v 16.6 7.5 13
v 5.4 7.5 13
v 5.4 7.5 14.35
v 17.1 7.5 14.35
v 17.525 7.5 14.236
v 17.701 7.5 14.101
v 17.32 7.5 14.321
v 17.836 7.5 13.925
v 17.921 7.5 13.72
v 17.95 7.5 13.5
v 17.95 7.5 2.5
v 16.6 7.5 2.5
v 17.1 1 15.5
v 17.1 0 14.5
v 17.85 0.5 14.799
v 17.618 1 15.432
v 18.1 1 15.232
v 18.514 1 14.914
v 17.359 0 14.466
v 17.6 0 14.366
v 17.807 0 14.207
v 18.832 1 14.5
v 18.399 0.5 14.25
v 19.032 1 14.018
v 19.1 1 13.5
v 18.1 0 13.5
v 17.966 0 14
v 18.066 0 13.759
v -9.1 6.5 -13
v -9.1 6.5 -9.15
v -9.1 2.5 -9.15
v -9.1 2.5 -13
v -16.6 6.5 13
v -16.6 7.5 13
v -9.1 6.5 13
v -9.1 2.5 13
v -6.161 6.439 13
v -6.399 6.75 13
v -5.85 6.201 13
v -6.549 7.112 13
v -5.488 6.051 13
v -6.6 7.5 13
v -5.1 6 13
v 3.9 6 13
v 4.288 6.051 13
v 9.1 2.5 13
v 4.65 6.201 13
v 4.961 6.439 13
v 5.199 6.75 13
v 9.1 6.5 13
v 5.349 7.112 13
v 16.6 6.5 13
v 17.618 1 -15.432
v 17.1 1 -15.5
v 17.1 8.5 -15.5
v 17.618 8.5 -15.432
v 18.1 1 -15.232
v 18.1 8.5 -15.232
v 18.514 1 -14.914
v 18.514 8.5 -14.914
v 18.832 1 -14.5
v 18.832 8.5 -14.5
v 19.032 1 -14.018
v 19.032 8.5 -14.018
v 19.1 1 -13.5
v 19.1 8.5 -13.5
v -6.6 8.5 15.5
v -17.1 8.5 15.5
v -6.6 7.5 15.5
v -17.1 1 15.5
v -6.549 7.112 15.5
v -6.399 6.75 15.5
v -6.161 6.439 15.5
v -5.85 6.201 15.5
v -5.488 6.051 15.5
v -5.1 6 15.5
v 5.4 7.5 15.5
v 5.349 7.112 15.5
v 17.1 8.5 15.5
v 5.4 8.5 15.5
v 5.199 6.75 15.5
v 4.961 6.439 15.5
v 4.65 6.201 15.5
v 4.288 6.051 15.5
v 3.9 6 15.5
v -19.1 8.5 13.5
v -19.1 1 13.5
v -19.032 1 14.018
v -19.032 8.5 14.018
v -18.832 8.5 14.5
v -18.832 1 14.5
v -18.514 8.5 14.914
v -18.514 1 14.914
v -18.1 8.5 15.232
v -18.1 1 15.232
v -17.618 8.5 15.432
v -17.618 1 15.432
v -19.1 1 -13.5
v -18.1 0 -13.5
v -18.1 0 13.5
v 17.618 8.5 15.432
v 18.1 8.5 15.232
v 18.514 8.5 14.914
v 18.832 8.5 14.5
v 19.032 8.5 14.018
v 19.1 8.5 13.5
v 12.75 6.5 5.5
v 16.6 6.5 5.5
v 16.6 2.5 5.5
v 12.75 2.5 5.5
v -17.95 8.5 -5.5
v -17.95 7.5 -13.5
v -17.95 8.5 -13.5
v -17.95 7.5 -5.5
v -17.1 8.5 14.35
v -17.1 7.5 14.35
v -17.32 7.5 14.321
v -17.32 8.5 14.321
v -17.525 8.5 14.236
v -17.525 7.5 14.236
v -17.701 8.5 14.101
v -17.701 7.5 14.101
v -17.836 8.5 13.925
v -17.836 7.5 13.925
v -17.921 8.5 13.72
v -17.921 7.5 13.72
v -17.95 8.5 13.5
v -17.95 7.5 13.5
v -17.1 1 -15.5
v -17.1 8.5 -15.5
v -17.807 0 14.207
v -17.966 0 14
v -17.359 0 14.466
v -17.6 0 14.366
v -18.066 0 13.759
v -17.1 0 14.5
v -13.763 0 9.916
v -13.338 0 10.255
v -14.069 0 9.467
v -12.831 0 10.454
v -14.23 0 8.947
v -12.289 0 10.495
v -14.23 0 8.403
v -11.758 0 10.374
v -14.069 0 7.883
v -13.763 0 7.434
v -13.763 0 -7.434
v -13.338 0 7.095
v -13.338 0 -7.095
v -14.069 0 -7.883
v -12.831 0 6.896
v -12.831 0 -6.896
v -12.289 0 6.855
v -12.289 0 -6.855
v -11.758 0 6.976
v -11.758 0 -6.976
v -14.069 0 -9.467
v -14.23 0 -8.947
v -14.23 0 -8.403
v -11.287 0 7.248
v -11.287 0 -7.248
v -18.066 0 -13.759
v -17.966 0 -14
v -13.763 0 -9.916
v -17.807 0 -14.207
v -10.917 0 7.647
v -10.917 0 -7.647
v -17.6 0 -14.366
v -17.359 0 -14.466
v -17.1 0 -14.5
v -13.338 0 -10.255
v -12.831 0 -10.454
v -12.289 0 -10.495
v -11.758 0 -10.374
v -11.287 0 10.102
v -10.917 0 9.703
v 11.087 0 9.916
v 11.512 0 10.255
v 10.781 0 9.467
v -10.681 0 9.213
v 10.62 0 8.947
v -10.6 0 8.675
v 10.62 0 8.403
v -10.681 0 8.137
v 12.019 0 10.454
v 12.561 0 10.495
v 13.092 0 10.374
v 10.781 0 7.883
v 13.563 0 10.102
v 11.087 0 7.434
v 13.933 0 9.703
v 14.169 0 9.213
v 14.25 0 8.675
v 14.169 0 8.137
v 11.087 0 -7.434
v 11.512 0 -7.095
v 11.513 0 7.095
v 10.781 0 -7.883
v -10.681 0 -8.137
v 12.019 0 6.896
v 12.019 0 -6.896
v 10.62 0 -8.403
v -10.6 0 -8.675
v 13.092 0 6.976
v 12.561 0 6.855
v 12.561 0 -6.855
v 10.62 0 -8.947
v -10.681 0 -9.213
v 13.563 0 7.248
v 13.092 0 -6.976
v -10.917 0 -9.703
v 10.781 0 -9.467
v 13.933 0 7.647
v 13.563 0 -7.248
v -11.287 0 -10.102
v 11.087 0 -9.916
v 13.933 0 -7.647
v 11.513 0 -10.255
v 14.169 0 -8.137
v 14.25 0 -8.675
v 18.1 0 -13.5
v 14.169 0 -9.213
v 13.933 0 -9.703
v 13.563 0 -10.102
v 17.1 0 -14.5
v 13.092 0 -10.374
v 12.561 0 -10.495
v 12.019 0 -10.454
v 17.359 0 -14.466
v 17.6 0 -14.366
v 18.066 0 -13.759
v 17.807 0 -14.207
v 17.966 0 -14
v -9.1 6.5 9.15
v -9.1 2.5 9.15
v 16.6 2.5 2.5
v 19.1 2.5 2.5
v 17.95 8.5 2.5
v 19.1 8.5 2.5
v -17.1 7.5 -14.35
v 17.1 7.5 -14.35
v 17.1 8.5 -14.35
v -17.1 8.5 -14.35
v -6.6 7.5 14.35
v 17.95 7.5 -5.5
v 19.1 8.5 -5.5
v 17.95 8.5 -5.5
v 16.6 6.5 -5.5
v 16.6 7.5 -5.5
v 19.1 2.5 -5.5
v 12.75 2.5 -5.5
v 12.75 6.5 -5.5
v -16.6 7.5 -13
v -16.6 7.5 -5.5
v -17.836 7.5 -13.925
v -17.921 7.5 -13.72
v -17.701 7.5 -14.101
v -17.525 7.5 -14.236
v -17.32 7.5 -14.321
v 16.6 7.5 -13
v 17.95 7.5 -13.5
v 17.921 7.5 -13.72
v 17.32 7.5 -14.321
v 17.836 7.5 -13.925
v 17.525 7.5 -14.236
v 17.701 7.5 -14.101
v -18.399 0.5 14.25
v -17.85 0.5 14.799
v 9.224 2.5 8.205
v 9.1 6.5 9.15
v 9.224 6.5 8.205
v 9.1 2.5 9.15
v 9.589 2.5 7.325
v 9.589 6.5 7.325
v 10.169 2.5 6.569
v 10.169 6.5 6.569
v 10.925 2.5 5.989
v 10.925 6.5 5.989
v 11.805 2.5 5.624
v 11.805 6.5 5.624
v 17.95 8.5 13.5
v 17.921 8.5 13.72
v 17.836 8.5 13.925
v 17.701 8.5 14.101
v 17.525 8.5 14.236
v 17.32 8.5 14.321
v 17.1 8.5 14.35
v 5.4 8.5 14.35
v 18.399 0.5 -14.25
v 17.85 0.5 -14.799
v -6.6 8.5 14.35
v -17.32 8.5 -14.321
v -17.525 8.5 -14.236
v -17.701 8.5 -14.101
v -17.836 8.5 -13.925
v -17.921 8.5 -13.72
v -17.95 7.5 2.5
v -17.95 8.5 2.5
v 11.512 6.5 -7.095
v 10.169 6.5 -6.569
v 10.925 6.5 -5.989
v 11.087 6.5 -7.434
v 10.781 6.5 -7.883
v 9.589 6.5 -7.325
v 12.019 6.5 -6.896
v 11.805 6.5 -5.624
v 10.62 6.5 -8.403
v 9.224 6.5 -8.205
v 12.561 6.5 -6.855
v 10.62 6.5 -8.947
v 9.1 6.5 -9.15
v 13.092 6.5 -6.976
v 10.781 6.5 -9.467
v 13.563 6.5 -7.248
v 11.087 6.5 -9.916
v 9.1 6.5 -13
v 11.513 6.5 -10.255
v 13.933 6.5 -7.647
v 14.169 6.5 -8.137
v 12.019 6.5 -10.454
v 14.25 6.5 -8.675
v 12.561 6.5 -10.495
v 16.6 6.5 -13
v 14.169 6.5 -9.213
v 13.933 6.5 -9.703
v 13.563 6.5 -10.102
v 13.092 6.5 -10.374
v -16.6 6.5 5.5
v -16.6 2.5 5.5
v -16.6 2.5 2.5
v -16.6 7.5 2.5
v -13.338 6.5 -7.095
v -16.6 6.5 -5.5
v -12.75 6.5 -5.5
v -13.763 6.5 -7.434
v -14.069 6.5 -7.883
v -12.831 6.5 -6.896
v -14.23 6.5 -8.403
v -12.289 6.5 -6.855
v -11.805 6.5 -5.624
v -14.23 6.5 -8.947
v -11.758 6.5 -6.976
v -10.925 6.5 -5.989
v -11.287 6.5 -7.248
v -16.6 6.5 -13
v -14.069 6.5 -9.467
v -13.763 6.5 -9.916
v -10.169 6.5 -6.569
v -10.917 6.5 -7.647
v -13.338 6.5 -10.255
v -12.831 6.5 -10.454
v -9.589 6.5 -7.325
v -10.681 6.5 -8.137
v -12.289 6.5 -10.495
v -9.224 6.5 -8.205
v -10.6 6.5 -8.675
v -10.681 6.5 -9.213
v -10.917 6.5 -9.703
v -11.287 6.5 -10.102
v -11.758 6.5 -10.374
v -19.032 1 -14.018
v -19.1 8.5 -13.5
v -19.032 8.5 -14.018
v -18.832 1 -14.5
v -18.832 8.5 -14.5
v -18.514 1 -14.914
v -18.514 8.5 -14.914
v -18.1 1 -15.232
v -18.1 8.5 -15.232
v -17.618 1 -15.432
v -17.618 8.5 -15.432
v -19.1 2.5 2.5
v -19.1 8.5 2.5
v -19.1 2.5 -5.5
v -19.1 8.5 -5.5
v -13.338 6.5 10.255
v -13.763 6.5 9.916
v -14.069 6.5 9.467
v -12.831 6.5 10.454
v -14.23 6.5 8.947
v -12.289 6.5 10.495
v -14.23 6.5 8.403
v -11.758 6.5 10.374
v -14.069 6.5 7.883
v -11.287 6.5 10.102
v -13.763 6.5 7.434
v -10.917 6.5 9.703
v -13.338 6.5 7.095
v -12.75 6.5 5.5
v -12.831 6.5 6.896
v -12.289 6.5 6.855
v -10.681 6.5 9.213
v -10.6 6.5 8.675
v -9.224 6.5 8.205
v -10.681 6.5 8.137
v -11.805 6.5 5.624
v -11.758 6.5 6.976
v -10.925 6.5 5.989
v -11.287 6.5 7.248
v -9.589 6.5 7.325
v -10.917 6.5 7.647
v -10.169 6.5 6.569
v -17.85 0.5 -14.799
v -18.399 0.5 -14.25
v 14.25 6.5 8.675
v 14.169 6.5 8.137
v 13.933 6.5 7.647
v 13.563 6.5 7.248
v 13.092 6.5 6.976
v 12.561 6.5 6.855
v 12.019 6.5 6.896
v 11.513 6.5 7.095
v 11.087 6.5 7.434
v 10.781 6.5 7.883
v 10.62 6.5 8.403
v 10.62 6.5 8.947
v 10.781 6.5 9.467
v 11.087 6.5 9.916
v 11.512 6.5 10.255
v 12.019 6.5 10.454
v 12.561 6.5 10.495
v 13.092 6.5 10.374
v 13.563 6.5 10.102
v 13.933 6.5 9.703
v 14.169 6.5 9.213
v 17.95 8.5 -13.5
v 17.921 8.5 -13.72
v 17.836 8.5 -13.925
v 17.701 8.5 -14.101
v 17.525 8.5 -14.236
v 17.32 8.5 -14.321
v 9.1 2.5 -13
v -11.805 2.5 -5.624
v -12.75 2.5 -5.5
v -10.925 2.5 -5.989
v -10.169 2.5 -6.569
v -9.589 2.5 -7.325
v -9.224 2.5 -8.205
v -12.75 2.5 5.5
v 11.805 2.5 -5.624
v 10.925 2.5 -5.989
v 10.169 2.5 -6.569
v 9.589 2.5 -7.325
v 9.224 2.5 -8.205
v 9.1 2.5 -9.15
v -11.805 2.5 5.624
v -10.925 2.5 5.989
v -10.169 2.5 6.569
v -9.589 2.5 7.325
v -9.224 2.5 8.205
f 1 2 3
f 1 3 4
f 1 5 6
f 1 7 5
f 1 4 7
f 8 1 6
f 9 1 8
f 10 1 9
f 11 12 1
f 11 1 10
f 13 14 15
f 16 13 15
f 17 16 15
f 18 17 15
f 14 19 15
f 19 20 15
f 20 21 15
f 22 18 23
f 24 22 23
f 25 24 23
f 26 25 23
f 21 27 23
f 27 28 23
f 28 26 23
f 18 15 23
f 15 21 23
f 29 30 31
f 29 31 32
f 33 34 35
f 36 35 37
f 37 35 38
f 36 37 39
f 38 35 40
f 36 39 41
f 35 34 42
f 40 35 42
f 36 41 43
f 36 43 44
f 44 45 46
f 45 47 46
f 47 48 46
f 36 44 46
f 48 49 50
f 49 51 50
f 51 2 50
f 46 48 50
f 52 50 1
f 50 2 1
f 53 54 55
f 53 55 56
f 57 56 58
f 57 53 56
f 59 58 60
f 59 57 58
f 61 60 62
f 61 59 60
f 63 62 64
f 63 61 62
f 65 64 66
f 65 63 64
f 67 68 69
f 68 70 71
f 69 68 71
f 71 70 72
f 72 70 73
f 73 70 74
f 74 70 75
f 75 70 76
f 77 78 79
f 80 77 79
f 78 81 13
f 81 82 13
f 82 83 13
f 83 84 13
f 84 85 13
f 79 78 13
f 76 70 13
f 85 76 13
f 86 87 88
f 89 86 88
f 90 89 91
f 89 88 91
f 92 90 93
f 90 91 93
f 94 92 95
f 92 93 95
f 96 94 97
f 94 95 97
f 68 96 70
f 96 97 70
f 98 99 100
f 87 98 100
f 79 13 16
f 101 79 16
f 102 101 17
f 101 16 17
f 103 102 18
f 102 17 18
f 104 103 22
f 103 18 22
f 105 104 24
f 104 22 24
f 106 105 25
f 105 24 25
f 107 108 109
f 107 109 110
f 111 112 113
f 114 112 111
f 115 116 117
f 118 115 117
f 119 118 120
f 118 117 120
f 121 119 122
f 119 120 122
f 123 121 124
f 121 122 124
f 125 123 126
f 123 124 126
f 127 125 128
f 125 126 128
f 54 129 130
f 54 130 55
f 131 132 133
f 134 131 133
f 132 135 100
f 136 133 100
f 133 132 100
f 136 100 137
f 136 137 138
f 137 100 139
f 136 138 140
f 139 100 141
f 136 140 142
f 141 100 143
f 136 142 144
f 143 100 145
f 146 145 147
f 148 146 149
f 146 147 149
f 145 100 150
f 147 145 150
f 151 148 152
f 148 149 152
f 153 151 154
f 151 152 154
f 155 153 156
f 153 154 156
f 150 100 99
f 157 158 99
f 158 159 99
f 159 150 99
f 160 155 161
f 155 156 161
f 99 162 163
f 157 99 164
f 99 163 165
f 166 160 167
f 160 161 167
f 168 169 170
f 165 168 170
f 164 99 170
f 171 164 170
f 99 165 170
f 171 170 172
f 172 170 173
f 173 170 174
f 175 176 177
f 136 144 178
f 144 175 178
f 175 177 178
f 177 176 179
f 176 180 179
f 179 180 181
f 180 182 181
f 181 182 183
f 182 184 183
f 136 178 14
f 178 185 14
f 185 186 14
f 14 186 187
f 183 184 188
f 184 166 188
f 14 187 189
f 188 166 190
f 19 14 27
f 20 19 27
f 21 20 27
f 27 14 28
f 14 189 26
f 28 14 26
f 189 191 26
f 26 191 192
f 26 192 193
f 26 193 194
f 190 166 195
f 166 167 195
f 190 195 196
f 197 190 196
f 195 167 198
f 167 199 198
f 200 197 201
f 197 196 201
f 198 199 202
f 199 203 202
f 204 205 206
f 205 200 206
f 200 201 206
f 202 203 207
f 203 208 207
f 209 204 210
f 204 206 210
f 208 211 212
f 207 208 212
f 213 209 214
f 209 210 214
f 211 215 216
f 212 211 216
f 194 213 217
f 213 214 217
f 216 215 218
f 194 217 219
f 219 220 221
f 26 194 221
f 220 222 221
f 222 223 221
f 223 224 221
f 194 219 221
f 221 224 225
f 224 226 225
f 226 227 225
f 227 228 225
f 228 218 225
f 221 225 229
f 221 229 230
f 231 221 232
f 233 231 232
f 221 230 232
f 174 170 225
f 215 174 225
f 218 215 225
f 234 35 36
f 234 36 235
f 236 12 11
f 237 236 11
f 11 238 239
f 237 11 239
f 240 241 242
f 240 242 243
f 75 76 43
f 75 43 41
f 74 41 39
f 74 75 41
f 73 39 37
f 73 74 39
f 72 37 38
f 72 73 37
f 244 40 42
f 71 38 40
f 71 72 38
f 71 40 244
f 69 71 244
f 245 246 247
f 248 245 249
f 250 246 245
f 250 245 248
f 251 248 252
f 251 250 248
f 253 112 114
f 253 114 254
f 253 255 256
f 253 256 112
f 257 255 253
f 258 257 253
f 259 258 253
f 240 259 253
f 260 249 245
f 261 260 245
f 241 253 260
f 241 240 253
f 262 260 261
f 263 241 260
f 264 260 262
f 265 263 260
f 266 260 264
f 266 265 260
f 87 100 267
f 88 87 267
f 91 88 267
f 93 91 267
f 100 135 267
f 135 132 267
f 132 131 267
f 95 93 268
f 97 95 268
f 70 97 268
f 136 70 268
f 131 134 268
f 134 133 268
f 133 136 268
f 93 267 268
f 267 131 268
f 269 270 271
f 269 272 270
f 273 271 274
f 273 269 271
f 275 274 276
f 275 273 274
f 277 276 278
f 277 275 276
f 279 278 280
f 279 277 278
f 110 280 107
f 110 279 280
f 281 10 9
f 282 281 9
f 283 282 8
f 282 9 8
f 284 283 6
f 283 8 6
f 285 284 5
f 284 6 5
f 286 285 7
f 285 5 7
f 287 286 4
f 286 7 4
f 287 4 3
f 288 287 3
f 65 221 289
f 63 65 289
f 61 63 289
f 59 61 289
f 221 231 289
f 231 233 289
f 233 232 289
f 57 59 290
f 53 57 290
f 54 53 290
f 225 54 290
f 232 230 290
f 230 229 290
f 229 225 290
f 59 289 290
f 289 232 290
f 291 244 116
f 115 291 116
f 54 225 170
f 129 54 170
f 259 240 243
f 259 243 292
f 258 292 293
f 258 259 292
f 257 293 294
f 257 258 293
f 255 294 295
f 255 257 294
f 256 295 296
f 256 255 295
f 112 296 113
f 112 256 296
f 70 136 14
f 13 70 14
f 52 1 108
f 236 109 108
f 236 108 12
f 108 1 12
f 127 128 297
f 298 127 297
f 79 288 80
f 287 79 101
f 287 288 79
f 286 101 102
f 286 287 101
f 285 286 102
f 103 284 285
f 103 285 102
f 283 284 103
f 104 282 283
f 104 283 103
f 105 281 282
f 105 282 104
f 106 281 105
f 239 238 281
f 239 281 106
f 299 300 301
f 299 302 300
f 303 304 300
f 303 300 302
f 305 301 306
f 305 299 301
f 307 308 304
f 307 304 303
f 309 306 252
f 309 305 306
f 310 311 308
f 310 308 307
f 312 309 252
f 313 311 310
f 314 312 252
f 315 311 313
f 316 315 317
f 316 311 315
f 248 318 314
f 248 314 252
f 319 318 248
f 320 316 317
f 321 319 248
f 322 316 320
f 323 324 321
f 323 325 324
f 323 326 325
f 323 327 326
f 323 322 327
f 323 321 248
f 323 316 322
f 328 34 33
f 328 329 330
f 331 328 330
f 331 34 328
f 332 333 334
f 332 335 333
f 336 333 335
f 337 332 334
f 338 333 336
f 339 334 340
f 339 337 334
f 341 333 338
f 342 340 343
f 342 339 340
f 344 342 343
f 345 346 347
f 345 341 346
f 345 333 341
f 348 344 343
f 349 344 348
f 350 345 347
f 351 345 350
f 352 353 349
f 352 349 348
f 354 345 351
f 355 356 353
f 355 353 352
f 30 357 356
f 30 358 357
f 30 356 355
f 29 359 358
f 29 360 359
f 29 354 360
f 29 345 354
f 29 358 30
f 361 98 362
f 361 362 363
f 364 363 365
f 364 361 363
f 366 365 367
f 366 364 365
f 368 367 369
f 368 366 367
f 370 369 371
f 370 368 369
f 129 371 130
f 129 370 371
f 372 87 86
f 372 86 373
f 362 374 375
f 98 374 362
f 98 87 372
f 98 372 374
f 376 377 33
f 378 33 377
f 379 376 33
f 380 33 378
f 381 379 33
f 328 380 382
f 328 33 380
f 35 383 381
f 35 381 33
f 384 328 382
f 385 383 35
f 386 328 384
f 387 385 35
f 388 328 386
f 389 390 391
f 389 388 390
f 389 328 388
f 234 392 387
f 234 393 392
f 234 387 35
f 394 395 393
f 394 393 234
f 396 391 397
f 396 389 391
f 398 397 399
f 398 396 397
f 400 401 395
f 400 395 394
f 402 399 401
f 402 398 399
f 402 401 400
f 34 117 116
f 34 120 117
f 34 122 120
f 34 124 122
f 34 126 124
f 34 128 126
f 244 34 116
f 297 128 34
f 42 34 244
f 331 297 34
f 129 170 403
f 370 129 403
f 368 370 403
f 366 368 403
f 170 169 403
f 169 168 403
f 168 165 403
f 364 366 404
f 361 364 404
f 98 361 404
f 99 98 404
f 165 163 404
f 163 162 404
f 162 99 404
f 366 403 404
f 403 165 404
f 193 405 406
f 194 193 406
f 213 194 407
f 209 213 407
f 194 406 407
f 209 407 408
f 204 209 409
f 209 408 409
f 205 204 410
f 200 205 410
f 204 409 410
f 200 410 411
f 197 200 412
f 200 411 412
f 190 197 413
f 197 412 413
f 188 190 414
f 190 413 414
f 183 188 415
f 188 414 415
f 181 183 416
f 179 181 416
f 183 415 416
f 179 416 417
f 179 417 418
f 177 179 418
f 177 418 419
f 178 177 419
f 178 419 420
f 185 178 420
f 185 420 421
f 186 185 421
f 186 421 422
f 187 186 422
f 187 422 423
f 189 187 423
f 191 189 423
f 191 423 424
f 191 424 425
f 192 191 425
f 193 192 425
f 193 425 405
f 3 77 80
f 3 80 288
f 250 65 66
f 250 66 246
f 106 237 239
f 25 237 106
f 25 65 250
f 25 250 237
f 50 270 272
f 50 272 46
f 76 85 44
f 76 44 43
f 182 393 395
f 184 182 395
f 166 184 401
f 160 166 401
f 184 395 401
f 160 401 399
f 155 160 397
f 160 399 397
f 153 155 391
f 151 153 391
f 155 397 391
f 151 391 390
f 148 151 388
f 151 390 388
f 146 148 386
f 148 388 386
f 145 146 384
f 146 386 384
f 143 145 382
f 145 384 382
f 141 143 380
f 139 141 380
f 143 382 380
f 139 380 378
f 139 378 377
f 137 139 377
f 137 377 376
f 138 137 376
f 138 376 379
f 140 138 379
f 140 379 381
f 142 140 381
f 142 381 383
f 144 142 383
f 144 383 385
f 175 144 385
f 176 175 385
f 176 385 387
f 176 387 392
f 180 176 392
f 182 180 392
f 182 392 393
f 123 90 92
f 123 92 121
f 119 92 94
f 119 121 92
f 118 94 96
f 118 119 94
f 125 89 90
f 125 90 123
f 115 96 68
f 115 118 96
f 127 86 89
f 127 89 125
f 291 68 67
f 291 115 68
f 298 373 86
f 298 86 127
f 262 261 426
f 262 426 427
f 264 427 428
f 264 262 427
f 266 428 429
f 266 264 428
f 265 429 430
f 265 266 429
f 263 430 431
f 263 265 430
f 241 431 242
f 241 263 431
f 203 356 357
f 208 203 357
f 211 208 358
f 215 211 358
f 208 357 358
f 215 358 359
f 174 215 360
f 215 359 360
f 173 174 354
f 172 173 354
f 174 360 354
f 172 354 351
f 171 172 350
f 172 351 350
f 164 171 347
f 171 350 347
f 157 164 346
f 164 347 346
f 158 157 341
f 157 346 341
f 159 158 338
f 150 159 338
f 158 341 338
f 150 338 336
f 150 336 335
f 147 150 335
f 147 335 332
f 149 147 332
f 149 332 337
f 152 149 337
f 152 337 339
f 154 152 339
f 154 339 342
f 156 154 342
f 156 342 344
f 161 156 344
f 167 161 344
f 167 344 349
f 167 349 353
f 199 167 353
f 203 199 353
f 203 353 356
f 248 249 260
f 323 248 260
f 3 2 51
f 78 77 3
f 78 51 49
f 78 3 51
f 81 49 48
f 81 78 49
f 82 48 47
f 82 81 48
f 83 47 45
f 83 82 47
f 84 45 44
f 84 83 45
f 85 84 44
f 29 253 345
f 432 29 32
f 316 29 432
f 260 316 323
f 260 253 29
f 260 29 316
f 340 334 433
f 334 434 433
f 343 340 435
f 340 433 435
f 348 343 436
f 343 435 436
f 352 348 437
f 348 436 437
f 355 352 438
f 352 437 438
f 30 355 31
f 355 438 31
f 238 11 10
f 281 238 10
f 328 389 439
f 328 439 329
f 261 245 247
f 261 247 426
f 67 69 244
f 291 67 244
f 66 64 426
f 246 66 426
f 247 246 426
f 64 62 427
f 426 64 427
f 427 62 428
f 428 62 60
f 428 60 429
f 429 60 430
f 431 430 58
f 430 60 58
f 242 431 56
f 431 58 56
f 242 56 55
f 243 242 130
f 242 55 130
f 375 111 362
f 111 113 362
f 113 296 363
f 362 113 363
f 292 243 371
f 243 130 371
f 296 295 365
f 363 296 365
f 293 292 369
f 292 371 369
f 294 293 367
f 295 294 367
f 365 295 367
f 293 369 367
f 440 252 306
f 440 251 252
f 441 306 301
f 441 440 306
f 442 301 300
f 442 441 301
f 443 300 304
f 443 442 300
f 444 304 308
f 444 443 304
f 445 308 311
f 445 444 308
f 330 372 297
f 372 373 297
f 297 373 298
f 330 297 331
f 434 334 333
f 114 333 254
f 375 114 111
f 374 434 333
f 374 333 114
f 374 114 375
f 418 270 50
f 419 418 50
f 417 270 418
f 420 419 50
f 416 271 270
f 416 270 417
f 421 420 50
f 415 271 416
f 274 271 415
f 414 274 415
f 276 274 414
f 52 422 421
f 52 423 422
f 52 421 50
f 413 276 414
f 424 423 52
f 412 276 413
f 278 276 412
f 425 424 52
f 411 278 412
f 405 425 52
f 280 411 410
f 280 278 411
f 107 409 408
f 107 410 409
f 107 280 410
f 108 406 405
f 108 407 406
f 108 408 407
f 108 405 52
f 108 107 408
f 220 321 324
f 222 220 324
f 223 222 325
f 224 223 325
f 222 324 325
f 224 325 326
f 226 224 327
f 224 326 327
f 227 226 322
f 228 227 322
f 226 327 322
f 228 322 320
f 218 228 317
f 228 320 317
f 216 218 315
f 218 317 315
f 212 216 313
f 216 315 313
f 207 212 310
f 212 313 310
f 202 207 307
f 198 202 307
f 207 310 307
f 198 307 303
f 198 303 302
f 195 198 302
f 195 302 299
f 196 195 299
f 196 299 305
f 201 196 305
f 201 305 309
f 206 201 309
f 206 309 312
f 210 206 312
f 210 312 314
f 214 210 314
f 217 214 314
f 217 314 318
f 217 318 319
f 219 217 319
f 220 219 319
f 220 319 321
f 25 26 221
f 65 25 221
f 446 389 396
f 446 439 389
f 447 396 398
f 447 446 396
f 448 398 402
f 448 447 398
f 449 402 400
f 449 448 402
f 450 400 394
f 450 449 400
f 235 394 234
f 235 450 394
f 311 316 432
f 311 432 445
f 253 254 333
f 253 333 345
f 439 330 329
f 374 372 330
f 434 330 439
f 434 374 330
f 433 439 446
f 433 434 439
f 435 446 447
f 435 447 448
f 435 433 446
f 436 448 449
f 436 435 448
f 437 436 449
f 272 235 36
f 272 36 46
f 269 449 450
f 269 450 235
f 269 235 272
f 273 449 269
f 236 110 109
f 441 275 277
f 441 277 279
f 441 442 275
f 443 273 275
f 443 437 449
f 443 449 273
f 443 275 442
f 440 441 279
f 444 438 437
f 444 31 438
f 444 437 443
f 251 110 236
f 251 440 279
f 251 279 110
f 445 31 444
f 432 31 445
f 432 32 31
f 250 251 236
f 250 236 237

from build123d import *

# Parameters (mm, degrees)
BOSS_EXTRUDE1_DEPTH = 7.5
CUT_EXTRUDE3_DEPTH  = 5
SKETCH3_R           = 1.825
CUT_EXTRUDE4_DEPTH  = 13.5
SKETCH4_W           = 33.2
SKETCH4_H           = 26
CUT_EXTRUDE5_DEPTH  = 1
SKETCH5_W           = 2.5
SKETCH5_H           = 8
CUT_EXTRUDE6_DEPTH  = 5
BOSS_EXTRUDE2_DEPTH = 1
CUT_EXTRUDE8_DEPTH  = 10
SKETCH9_W           = 0.917517868
SKETCH9_H           = 1.289779541
SKETCH9_W_2         = 0.704402717
CUT_EXTRUDE9_DEPTH  = 1
CHAMFER1_SIZE       = 1
FILLET1_R           = 3.65


with BuildPart() as part:
    # Sketch1 → Boss-Extrude1 (new body)
    with BuildSketch(Plane(origin=(0, 0, 0), x_dir=(1, 0, 0), z_dir=(0, 1, 0))):
        with BuildLine():
            Line((-17.1, -15.5), (17.1, -15.5))
            ThreePointArc((17.1, -15.5), (18.514213562, -14.914213562), (19.1, -13.5))
            Line((19.1, -13.5), (19.1, 13.5))
            ThreePointArc((19.1, 13.5), (18.514213562, 14.914213562), (17.1, 15.5))
            Line((17.1, 15.5), (-17.1, 15.5))
            ThreePointArc((-17.1, 15.5), (-18.514213562, 14.914213562), (-19.1, 13.5))
            Line((-19.1, 13.5), (-19.1, -13.5))
            ThreePointArc((-19.1, -13.5), (-18.514213562, -14.914213562), (-17.1, -15.5))
        make_face()
    extrude(amount=BOSS_EXTRUDE1_DEPTH)

    # Sketch2 → Cut-Extrude3 (cut)
    with BuildSketch(Plane(origin=(0, 7.5, 0), x_dir=(1, 0, 0), z_dir=(0, 1, 0))):
        Polygon((-16.6, 5.5), (-9.1, 5.5), (-9.1, 13), (9.1, 13), (9.1, 5.5), (16.6, 5.5), (16.6, -5.5), (9.1, -5.5), (9.1, -13), (-9.1, -13), (-9.1, -5.5), (-16.6, -5.5), align=None)
    extrude(amount=-CUT_EXTRUDE3_DEPTH, mode=Mode.SUBTRACT)

    # Sketch3 → Cut-Extrude4 (cut)
    with BuildSketch(Plane(origin=(0, 7.5, 0), x_dir=(1, 0, 0), z_dir=(0, 1, 0))):
        with Locations((-12.425, 8.675)):
            Circle(SKETCH3_R)
        with Locations((12.425, 8.675)):
            Circle(SKETCH3_R)
        with Locations((12.425, -8.675)):
            Circle(SKETCH3_R)
        with Locations((-12.425, -8.675)):
            Circle(SKETCH3_R)
    extrude(amount=-CUT_EXTRUDE4_DEPTH, mode=Mode.SUBTRACT)

    # Sketch4 → Cut-Extrude5 (cut)
    with BuildSketch(Plane(origin=(0, 7.5, 0), x_dir=(1, 0, 0), z_dir=(0, 1, 0))):
        Rectangle(SKETCH4_W, SKETCH4_H)
    extrude(amount=-CUT_EXTRUDE5_DEPTH, mode=Mode.SUBTRACT)

    # Sketch5 → Cut-Extrude6 (cut)
    with BuildSketch(Plane(origin=(0, 7.5, 0), x_dir=(1, 0, 0), z_dir=(0, 1, 0))):
        with Locations((-17.85, 1.5)):
            Rectangle(SKETCH5_W, SKETCH5_H)
        with Locations((17.85, 1.5)):
            Rectangle(SKETCH5_W, SKETCH5_H)
    extrude(amount=-CUT_EXTRUDE6_DEPTH, mode=Mode.SUBTRACT)

    # Sketch6 → Boss-Extrude2 (add)
    with BuildSketch(Plane(origin=(0, 7.5, 0), x_dir=(1, 0, 0), z_dir=(0, 1, 0))):
        with BuildLine():
            Line((-17.95, 5.5), (-19.1, 5.5))
            Line((-19.1, 5.5), (-19.1, 13.5))
            ThreePointArc((-19.1, 13.5), (-18.514213562, 14.914213562), (-17.1, 15.5))
            Line((-17.1, 15.5), (17.1, 15.5))
            ThreePointArc((17.1, 15.5), (18.514213562, 14.914213562), (19.1, 13.5))
            Line((19.1, 13.5), (19.1, 5.5))
            Line((19.1, 5.5), (17.95, 5.5))
            Line((17.95, 5.5), (17.95, 13.5))
            ThreePointArc((17.95, 13.5), (17.701040764, 14.101040764), (17.1, 14.35))
            Line((17.1, 14.35), (-17.1, 14.35))
            ThreePointArc((-17.1, 14.35), (-17.701040764, 14.101040764), (-17.95, 13.5))
            Line((-17.95, 13.5), (-17.95, 5.5))
        make_face()
        with BuildLine():
            Line((-17.95, -2.5), (-19.1, -2.5))
            Line((-19.1, -2.5), (-19.1, -13.5))
            ThreePointArc((-19.1, -13.5), (-18.514213562, -14.914213562), (-17.1, -15.5))
            Line((-17.1, -15.5), (17.1, -15.5))
            ThreePointArc((17.1, -15.5), (18.514213562, -14.914213562), (19.1, -13.5))
            Line((19.1, -13.5), (19.1, -2.5))
            Line((19.1, -2.5), (17.95, -2.5))
            Line((17.95, -2.5), (17.95, -13.5))
            ThreePointArc((17.95, -13.5), (17.701040764, -14.101040764), (17.1, -14.35))
            Line((17.1, -14.35), (-17.1, -14.35))
            ThreePointArc((-17.1, -14.35), (-17.701040764, -14.101040764), (-17.95, -13.5))
            Line((-17.95, -13.5), (-17.95, -2.5))
        make_face()
    extrude(amount=BOSS_EXTRUDE2_DEPTH)

    # Sketch7 → Cut-Extrude8 (cut)
    with BuildSketch(Plane.XY.offset(15.5)):
        with BuildLine():
            Line((-5.1, 9), (3.9, 9))
            ThreePointArc((3.9, 9), (5.4, 7.5), (3.9, 6))
            Line((3.9, 6), (-5.1, 6))
            ThreePointArc((-5.1, 6), (-6.6, 7.5), (-5.1, 9))
        make_face()
    extrude(amount=-CUT_EXTRUDE8_DEPTH, mode=Mode.SUBTRACT)

    # Sketch9 → Cut-Extrude9 (cut)
    with BuildSketch(Plane(origin=(0, 7.5, 0), x_dir=(1, 0, 0), z_dir=(0, 1, 0))):
        with Locations((-6.141241066, -14.994889771)):
            Rectangle(SKETCH9_W, SKETCH9_H)
        with Locations((5.047798642, -14.994889771)):
            Rectangle(SKETCH9_W_2, SKETCH9_H)
    extrude(amount=CUT_EXTRUDE9_DEPTH, mode=Mode.SUBTRACT)

    # Chamfer1
    chamfer1_edges = [part.edges().sort_by_distance(p)[0] for p in [
        (-19.1, 0, 0),
        (-18.514213562, 0, -14.914213562),
        (0, 0, -15.5),
        (18.514213562, 0, -14.914213562),
        (19.1, 0, 0),
        (18.514213562, 0, 14.914213562),
        (0, 0, 15.5),
        (-18.514213562, 0, 14.914213562),
    ]]
    chamfer(chamfer1_edges, length=CHAMFER1_SIZE)

    # Fillet1
    fillet1_edges = [part.edges().sort_by_distance(p)[0] for p in [
        (-9.1, 4.5, 5.5),
        (-9.1, 4.5, -5.5),
        (9.1, 4.5, -5.5),
        (9.1, 4.5, 5.5),
    ]]
    fillet(fillet1_edges, radius=FILLET1_R)


solid = part.part
